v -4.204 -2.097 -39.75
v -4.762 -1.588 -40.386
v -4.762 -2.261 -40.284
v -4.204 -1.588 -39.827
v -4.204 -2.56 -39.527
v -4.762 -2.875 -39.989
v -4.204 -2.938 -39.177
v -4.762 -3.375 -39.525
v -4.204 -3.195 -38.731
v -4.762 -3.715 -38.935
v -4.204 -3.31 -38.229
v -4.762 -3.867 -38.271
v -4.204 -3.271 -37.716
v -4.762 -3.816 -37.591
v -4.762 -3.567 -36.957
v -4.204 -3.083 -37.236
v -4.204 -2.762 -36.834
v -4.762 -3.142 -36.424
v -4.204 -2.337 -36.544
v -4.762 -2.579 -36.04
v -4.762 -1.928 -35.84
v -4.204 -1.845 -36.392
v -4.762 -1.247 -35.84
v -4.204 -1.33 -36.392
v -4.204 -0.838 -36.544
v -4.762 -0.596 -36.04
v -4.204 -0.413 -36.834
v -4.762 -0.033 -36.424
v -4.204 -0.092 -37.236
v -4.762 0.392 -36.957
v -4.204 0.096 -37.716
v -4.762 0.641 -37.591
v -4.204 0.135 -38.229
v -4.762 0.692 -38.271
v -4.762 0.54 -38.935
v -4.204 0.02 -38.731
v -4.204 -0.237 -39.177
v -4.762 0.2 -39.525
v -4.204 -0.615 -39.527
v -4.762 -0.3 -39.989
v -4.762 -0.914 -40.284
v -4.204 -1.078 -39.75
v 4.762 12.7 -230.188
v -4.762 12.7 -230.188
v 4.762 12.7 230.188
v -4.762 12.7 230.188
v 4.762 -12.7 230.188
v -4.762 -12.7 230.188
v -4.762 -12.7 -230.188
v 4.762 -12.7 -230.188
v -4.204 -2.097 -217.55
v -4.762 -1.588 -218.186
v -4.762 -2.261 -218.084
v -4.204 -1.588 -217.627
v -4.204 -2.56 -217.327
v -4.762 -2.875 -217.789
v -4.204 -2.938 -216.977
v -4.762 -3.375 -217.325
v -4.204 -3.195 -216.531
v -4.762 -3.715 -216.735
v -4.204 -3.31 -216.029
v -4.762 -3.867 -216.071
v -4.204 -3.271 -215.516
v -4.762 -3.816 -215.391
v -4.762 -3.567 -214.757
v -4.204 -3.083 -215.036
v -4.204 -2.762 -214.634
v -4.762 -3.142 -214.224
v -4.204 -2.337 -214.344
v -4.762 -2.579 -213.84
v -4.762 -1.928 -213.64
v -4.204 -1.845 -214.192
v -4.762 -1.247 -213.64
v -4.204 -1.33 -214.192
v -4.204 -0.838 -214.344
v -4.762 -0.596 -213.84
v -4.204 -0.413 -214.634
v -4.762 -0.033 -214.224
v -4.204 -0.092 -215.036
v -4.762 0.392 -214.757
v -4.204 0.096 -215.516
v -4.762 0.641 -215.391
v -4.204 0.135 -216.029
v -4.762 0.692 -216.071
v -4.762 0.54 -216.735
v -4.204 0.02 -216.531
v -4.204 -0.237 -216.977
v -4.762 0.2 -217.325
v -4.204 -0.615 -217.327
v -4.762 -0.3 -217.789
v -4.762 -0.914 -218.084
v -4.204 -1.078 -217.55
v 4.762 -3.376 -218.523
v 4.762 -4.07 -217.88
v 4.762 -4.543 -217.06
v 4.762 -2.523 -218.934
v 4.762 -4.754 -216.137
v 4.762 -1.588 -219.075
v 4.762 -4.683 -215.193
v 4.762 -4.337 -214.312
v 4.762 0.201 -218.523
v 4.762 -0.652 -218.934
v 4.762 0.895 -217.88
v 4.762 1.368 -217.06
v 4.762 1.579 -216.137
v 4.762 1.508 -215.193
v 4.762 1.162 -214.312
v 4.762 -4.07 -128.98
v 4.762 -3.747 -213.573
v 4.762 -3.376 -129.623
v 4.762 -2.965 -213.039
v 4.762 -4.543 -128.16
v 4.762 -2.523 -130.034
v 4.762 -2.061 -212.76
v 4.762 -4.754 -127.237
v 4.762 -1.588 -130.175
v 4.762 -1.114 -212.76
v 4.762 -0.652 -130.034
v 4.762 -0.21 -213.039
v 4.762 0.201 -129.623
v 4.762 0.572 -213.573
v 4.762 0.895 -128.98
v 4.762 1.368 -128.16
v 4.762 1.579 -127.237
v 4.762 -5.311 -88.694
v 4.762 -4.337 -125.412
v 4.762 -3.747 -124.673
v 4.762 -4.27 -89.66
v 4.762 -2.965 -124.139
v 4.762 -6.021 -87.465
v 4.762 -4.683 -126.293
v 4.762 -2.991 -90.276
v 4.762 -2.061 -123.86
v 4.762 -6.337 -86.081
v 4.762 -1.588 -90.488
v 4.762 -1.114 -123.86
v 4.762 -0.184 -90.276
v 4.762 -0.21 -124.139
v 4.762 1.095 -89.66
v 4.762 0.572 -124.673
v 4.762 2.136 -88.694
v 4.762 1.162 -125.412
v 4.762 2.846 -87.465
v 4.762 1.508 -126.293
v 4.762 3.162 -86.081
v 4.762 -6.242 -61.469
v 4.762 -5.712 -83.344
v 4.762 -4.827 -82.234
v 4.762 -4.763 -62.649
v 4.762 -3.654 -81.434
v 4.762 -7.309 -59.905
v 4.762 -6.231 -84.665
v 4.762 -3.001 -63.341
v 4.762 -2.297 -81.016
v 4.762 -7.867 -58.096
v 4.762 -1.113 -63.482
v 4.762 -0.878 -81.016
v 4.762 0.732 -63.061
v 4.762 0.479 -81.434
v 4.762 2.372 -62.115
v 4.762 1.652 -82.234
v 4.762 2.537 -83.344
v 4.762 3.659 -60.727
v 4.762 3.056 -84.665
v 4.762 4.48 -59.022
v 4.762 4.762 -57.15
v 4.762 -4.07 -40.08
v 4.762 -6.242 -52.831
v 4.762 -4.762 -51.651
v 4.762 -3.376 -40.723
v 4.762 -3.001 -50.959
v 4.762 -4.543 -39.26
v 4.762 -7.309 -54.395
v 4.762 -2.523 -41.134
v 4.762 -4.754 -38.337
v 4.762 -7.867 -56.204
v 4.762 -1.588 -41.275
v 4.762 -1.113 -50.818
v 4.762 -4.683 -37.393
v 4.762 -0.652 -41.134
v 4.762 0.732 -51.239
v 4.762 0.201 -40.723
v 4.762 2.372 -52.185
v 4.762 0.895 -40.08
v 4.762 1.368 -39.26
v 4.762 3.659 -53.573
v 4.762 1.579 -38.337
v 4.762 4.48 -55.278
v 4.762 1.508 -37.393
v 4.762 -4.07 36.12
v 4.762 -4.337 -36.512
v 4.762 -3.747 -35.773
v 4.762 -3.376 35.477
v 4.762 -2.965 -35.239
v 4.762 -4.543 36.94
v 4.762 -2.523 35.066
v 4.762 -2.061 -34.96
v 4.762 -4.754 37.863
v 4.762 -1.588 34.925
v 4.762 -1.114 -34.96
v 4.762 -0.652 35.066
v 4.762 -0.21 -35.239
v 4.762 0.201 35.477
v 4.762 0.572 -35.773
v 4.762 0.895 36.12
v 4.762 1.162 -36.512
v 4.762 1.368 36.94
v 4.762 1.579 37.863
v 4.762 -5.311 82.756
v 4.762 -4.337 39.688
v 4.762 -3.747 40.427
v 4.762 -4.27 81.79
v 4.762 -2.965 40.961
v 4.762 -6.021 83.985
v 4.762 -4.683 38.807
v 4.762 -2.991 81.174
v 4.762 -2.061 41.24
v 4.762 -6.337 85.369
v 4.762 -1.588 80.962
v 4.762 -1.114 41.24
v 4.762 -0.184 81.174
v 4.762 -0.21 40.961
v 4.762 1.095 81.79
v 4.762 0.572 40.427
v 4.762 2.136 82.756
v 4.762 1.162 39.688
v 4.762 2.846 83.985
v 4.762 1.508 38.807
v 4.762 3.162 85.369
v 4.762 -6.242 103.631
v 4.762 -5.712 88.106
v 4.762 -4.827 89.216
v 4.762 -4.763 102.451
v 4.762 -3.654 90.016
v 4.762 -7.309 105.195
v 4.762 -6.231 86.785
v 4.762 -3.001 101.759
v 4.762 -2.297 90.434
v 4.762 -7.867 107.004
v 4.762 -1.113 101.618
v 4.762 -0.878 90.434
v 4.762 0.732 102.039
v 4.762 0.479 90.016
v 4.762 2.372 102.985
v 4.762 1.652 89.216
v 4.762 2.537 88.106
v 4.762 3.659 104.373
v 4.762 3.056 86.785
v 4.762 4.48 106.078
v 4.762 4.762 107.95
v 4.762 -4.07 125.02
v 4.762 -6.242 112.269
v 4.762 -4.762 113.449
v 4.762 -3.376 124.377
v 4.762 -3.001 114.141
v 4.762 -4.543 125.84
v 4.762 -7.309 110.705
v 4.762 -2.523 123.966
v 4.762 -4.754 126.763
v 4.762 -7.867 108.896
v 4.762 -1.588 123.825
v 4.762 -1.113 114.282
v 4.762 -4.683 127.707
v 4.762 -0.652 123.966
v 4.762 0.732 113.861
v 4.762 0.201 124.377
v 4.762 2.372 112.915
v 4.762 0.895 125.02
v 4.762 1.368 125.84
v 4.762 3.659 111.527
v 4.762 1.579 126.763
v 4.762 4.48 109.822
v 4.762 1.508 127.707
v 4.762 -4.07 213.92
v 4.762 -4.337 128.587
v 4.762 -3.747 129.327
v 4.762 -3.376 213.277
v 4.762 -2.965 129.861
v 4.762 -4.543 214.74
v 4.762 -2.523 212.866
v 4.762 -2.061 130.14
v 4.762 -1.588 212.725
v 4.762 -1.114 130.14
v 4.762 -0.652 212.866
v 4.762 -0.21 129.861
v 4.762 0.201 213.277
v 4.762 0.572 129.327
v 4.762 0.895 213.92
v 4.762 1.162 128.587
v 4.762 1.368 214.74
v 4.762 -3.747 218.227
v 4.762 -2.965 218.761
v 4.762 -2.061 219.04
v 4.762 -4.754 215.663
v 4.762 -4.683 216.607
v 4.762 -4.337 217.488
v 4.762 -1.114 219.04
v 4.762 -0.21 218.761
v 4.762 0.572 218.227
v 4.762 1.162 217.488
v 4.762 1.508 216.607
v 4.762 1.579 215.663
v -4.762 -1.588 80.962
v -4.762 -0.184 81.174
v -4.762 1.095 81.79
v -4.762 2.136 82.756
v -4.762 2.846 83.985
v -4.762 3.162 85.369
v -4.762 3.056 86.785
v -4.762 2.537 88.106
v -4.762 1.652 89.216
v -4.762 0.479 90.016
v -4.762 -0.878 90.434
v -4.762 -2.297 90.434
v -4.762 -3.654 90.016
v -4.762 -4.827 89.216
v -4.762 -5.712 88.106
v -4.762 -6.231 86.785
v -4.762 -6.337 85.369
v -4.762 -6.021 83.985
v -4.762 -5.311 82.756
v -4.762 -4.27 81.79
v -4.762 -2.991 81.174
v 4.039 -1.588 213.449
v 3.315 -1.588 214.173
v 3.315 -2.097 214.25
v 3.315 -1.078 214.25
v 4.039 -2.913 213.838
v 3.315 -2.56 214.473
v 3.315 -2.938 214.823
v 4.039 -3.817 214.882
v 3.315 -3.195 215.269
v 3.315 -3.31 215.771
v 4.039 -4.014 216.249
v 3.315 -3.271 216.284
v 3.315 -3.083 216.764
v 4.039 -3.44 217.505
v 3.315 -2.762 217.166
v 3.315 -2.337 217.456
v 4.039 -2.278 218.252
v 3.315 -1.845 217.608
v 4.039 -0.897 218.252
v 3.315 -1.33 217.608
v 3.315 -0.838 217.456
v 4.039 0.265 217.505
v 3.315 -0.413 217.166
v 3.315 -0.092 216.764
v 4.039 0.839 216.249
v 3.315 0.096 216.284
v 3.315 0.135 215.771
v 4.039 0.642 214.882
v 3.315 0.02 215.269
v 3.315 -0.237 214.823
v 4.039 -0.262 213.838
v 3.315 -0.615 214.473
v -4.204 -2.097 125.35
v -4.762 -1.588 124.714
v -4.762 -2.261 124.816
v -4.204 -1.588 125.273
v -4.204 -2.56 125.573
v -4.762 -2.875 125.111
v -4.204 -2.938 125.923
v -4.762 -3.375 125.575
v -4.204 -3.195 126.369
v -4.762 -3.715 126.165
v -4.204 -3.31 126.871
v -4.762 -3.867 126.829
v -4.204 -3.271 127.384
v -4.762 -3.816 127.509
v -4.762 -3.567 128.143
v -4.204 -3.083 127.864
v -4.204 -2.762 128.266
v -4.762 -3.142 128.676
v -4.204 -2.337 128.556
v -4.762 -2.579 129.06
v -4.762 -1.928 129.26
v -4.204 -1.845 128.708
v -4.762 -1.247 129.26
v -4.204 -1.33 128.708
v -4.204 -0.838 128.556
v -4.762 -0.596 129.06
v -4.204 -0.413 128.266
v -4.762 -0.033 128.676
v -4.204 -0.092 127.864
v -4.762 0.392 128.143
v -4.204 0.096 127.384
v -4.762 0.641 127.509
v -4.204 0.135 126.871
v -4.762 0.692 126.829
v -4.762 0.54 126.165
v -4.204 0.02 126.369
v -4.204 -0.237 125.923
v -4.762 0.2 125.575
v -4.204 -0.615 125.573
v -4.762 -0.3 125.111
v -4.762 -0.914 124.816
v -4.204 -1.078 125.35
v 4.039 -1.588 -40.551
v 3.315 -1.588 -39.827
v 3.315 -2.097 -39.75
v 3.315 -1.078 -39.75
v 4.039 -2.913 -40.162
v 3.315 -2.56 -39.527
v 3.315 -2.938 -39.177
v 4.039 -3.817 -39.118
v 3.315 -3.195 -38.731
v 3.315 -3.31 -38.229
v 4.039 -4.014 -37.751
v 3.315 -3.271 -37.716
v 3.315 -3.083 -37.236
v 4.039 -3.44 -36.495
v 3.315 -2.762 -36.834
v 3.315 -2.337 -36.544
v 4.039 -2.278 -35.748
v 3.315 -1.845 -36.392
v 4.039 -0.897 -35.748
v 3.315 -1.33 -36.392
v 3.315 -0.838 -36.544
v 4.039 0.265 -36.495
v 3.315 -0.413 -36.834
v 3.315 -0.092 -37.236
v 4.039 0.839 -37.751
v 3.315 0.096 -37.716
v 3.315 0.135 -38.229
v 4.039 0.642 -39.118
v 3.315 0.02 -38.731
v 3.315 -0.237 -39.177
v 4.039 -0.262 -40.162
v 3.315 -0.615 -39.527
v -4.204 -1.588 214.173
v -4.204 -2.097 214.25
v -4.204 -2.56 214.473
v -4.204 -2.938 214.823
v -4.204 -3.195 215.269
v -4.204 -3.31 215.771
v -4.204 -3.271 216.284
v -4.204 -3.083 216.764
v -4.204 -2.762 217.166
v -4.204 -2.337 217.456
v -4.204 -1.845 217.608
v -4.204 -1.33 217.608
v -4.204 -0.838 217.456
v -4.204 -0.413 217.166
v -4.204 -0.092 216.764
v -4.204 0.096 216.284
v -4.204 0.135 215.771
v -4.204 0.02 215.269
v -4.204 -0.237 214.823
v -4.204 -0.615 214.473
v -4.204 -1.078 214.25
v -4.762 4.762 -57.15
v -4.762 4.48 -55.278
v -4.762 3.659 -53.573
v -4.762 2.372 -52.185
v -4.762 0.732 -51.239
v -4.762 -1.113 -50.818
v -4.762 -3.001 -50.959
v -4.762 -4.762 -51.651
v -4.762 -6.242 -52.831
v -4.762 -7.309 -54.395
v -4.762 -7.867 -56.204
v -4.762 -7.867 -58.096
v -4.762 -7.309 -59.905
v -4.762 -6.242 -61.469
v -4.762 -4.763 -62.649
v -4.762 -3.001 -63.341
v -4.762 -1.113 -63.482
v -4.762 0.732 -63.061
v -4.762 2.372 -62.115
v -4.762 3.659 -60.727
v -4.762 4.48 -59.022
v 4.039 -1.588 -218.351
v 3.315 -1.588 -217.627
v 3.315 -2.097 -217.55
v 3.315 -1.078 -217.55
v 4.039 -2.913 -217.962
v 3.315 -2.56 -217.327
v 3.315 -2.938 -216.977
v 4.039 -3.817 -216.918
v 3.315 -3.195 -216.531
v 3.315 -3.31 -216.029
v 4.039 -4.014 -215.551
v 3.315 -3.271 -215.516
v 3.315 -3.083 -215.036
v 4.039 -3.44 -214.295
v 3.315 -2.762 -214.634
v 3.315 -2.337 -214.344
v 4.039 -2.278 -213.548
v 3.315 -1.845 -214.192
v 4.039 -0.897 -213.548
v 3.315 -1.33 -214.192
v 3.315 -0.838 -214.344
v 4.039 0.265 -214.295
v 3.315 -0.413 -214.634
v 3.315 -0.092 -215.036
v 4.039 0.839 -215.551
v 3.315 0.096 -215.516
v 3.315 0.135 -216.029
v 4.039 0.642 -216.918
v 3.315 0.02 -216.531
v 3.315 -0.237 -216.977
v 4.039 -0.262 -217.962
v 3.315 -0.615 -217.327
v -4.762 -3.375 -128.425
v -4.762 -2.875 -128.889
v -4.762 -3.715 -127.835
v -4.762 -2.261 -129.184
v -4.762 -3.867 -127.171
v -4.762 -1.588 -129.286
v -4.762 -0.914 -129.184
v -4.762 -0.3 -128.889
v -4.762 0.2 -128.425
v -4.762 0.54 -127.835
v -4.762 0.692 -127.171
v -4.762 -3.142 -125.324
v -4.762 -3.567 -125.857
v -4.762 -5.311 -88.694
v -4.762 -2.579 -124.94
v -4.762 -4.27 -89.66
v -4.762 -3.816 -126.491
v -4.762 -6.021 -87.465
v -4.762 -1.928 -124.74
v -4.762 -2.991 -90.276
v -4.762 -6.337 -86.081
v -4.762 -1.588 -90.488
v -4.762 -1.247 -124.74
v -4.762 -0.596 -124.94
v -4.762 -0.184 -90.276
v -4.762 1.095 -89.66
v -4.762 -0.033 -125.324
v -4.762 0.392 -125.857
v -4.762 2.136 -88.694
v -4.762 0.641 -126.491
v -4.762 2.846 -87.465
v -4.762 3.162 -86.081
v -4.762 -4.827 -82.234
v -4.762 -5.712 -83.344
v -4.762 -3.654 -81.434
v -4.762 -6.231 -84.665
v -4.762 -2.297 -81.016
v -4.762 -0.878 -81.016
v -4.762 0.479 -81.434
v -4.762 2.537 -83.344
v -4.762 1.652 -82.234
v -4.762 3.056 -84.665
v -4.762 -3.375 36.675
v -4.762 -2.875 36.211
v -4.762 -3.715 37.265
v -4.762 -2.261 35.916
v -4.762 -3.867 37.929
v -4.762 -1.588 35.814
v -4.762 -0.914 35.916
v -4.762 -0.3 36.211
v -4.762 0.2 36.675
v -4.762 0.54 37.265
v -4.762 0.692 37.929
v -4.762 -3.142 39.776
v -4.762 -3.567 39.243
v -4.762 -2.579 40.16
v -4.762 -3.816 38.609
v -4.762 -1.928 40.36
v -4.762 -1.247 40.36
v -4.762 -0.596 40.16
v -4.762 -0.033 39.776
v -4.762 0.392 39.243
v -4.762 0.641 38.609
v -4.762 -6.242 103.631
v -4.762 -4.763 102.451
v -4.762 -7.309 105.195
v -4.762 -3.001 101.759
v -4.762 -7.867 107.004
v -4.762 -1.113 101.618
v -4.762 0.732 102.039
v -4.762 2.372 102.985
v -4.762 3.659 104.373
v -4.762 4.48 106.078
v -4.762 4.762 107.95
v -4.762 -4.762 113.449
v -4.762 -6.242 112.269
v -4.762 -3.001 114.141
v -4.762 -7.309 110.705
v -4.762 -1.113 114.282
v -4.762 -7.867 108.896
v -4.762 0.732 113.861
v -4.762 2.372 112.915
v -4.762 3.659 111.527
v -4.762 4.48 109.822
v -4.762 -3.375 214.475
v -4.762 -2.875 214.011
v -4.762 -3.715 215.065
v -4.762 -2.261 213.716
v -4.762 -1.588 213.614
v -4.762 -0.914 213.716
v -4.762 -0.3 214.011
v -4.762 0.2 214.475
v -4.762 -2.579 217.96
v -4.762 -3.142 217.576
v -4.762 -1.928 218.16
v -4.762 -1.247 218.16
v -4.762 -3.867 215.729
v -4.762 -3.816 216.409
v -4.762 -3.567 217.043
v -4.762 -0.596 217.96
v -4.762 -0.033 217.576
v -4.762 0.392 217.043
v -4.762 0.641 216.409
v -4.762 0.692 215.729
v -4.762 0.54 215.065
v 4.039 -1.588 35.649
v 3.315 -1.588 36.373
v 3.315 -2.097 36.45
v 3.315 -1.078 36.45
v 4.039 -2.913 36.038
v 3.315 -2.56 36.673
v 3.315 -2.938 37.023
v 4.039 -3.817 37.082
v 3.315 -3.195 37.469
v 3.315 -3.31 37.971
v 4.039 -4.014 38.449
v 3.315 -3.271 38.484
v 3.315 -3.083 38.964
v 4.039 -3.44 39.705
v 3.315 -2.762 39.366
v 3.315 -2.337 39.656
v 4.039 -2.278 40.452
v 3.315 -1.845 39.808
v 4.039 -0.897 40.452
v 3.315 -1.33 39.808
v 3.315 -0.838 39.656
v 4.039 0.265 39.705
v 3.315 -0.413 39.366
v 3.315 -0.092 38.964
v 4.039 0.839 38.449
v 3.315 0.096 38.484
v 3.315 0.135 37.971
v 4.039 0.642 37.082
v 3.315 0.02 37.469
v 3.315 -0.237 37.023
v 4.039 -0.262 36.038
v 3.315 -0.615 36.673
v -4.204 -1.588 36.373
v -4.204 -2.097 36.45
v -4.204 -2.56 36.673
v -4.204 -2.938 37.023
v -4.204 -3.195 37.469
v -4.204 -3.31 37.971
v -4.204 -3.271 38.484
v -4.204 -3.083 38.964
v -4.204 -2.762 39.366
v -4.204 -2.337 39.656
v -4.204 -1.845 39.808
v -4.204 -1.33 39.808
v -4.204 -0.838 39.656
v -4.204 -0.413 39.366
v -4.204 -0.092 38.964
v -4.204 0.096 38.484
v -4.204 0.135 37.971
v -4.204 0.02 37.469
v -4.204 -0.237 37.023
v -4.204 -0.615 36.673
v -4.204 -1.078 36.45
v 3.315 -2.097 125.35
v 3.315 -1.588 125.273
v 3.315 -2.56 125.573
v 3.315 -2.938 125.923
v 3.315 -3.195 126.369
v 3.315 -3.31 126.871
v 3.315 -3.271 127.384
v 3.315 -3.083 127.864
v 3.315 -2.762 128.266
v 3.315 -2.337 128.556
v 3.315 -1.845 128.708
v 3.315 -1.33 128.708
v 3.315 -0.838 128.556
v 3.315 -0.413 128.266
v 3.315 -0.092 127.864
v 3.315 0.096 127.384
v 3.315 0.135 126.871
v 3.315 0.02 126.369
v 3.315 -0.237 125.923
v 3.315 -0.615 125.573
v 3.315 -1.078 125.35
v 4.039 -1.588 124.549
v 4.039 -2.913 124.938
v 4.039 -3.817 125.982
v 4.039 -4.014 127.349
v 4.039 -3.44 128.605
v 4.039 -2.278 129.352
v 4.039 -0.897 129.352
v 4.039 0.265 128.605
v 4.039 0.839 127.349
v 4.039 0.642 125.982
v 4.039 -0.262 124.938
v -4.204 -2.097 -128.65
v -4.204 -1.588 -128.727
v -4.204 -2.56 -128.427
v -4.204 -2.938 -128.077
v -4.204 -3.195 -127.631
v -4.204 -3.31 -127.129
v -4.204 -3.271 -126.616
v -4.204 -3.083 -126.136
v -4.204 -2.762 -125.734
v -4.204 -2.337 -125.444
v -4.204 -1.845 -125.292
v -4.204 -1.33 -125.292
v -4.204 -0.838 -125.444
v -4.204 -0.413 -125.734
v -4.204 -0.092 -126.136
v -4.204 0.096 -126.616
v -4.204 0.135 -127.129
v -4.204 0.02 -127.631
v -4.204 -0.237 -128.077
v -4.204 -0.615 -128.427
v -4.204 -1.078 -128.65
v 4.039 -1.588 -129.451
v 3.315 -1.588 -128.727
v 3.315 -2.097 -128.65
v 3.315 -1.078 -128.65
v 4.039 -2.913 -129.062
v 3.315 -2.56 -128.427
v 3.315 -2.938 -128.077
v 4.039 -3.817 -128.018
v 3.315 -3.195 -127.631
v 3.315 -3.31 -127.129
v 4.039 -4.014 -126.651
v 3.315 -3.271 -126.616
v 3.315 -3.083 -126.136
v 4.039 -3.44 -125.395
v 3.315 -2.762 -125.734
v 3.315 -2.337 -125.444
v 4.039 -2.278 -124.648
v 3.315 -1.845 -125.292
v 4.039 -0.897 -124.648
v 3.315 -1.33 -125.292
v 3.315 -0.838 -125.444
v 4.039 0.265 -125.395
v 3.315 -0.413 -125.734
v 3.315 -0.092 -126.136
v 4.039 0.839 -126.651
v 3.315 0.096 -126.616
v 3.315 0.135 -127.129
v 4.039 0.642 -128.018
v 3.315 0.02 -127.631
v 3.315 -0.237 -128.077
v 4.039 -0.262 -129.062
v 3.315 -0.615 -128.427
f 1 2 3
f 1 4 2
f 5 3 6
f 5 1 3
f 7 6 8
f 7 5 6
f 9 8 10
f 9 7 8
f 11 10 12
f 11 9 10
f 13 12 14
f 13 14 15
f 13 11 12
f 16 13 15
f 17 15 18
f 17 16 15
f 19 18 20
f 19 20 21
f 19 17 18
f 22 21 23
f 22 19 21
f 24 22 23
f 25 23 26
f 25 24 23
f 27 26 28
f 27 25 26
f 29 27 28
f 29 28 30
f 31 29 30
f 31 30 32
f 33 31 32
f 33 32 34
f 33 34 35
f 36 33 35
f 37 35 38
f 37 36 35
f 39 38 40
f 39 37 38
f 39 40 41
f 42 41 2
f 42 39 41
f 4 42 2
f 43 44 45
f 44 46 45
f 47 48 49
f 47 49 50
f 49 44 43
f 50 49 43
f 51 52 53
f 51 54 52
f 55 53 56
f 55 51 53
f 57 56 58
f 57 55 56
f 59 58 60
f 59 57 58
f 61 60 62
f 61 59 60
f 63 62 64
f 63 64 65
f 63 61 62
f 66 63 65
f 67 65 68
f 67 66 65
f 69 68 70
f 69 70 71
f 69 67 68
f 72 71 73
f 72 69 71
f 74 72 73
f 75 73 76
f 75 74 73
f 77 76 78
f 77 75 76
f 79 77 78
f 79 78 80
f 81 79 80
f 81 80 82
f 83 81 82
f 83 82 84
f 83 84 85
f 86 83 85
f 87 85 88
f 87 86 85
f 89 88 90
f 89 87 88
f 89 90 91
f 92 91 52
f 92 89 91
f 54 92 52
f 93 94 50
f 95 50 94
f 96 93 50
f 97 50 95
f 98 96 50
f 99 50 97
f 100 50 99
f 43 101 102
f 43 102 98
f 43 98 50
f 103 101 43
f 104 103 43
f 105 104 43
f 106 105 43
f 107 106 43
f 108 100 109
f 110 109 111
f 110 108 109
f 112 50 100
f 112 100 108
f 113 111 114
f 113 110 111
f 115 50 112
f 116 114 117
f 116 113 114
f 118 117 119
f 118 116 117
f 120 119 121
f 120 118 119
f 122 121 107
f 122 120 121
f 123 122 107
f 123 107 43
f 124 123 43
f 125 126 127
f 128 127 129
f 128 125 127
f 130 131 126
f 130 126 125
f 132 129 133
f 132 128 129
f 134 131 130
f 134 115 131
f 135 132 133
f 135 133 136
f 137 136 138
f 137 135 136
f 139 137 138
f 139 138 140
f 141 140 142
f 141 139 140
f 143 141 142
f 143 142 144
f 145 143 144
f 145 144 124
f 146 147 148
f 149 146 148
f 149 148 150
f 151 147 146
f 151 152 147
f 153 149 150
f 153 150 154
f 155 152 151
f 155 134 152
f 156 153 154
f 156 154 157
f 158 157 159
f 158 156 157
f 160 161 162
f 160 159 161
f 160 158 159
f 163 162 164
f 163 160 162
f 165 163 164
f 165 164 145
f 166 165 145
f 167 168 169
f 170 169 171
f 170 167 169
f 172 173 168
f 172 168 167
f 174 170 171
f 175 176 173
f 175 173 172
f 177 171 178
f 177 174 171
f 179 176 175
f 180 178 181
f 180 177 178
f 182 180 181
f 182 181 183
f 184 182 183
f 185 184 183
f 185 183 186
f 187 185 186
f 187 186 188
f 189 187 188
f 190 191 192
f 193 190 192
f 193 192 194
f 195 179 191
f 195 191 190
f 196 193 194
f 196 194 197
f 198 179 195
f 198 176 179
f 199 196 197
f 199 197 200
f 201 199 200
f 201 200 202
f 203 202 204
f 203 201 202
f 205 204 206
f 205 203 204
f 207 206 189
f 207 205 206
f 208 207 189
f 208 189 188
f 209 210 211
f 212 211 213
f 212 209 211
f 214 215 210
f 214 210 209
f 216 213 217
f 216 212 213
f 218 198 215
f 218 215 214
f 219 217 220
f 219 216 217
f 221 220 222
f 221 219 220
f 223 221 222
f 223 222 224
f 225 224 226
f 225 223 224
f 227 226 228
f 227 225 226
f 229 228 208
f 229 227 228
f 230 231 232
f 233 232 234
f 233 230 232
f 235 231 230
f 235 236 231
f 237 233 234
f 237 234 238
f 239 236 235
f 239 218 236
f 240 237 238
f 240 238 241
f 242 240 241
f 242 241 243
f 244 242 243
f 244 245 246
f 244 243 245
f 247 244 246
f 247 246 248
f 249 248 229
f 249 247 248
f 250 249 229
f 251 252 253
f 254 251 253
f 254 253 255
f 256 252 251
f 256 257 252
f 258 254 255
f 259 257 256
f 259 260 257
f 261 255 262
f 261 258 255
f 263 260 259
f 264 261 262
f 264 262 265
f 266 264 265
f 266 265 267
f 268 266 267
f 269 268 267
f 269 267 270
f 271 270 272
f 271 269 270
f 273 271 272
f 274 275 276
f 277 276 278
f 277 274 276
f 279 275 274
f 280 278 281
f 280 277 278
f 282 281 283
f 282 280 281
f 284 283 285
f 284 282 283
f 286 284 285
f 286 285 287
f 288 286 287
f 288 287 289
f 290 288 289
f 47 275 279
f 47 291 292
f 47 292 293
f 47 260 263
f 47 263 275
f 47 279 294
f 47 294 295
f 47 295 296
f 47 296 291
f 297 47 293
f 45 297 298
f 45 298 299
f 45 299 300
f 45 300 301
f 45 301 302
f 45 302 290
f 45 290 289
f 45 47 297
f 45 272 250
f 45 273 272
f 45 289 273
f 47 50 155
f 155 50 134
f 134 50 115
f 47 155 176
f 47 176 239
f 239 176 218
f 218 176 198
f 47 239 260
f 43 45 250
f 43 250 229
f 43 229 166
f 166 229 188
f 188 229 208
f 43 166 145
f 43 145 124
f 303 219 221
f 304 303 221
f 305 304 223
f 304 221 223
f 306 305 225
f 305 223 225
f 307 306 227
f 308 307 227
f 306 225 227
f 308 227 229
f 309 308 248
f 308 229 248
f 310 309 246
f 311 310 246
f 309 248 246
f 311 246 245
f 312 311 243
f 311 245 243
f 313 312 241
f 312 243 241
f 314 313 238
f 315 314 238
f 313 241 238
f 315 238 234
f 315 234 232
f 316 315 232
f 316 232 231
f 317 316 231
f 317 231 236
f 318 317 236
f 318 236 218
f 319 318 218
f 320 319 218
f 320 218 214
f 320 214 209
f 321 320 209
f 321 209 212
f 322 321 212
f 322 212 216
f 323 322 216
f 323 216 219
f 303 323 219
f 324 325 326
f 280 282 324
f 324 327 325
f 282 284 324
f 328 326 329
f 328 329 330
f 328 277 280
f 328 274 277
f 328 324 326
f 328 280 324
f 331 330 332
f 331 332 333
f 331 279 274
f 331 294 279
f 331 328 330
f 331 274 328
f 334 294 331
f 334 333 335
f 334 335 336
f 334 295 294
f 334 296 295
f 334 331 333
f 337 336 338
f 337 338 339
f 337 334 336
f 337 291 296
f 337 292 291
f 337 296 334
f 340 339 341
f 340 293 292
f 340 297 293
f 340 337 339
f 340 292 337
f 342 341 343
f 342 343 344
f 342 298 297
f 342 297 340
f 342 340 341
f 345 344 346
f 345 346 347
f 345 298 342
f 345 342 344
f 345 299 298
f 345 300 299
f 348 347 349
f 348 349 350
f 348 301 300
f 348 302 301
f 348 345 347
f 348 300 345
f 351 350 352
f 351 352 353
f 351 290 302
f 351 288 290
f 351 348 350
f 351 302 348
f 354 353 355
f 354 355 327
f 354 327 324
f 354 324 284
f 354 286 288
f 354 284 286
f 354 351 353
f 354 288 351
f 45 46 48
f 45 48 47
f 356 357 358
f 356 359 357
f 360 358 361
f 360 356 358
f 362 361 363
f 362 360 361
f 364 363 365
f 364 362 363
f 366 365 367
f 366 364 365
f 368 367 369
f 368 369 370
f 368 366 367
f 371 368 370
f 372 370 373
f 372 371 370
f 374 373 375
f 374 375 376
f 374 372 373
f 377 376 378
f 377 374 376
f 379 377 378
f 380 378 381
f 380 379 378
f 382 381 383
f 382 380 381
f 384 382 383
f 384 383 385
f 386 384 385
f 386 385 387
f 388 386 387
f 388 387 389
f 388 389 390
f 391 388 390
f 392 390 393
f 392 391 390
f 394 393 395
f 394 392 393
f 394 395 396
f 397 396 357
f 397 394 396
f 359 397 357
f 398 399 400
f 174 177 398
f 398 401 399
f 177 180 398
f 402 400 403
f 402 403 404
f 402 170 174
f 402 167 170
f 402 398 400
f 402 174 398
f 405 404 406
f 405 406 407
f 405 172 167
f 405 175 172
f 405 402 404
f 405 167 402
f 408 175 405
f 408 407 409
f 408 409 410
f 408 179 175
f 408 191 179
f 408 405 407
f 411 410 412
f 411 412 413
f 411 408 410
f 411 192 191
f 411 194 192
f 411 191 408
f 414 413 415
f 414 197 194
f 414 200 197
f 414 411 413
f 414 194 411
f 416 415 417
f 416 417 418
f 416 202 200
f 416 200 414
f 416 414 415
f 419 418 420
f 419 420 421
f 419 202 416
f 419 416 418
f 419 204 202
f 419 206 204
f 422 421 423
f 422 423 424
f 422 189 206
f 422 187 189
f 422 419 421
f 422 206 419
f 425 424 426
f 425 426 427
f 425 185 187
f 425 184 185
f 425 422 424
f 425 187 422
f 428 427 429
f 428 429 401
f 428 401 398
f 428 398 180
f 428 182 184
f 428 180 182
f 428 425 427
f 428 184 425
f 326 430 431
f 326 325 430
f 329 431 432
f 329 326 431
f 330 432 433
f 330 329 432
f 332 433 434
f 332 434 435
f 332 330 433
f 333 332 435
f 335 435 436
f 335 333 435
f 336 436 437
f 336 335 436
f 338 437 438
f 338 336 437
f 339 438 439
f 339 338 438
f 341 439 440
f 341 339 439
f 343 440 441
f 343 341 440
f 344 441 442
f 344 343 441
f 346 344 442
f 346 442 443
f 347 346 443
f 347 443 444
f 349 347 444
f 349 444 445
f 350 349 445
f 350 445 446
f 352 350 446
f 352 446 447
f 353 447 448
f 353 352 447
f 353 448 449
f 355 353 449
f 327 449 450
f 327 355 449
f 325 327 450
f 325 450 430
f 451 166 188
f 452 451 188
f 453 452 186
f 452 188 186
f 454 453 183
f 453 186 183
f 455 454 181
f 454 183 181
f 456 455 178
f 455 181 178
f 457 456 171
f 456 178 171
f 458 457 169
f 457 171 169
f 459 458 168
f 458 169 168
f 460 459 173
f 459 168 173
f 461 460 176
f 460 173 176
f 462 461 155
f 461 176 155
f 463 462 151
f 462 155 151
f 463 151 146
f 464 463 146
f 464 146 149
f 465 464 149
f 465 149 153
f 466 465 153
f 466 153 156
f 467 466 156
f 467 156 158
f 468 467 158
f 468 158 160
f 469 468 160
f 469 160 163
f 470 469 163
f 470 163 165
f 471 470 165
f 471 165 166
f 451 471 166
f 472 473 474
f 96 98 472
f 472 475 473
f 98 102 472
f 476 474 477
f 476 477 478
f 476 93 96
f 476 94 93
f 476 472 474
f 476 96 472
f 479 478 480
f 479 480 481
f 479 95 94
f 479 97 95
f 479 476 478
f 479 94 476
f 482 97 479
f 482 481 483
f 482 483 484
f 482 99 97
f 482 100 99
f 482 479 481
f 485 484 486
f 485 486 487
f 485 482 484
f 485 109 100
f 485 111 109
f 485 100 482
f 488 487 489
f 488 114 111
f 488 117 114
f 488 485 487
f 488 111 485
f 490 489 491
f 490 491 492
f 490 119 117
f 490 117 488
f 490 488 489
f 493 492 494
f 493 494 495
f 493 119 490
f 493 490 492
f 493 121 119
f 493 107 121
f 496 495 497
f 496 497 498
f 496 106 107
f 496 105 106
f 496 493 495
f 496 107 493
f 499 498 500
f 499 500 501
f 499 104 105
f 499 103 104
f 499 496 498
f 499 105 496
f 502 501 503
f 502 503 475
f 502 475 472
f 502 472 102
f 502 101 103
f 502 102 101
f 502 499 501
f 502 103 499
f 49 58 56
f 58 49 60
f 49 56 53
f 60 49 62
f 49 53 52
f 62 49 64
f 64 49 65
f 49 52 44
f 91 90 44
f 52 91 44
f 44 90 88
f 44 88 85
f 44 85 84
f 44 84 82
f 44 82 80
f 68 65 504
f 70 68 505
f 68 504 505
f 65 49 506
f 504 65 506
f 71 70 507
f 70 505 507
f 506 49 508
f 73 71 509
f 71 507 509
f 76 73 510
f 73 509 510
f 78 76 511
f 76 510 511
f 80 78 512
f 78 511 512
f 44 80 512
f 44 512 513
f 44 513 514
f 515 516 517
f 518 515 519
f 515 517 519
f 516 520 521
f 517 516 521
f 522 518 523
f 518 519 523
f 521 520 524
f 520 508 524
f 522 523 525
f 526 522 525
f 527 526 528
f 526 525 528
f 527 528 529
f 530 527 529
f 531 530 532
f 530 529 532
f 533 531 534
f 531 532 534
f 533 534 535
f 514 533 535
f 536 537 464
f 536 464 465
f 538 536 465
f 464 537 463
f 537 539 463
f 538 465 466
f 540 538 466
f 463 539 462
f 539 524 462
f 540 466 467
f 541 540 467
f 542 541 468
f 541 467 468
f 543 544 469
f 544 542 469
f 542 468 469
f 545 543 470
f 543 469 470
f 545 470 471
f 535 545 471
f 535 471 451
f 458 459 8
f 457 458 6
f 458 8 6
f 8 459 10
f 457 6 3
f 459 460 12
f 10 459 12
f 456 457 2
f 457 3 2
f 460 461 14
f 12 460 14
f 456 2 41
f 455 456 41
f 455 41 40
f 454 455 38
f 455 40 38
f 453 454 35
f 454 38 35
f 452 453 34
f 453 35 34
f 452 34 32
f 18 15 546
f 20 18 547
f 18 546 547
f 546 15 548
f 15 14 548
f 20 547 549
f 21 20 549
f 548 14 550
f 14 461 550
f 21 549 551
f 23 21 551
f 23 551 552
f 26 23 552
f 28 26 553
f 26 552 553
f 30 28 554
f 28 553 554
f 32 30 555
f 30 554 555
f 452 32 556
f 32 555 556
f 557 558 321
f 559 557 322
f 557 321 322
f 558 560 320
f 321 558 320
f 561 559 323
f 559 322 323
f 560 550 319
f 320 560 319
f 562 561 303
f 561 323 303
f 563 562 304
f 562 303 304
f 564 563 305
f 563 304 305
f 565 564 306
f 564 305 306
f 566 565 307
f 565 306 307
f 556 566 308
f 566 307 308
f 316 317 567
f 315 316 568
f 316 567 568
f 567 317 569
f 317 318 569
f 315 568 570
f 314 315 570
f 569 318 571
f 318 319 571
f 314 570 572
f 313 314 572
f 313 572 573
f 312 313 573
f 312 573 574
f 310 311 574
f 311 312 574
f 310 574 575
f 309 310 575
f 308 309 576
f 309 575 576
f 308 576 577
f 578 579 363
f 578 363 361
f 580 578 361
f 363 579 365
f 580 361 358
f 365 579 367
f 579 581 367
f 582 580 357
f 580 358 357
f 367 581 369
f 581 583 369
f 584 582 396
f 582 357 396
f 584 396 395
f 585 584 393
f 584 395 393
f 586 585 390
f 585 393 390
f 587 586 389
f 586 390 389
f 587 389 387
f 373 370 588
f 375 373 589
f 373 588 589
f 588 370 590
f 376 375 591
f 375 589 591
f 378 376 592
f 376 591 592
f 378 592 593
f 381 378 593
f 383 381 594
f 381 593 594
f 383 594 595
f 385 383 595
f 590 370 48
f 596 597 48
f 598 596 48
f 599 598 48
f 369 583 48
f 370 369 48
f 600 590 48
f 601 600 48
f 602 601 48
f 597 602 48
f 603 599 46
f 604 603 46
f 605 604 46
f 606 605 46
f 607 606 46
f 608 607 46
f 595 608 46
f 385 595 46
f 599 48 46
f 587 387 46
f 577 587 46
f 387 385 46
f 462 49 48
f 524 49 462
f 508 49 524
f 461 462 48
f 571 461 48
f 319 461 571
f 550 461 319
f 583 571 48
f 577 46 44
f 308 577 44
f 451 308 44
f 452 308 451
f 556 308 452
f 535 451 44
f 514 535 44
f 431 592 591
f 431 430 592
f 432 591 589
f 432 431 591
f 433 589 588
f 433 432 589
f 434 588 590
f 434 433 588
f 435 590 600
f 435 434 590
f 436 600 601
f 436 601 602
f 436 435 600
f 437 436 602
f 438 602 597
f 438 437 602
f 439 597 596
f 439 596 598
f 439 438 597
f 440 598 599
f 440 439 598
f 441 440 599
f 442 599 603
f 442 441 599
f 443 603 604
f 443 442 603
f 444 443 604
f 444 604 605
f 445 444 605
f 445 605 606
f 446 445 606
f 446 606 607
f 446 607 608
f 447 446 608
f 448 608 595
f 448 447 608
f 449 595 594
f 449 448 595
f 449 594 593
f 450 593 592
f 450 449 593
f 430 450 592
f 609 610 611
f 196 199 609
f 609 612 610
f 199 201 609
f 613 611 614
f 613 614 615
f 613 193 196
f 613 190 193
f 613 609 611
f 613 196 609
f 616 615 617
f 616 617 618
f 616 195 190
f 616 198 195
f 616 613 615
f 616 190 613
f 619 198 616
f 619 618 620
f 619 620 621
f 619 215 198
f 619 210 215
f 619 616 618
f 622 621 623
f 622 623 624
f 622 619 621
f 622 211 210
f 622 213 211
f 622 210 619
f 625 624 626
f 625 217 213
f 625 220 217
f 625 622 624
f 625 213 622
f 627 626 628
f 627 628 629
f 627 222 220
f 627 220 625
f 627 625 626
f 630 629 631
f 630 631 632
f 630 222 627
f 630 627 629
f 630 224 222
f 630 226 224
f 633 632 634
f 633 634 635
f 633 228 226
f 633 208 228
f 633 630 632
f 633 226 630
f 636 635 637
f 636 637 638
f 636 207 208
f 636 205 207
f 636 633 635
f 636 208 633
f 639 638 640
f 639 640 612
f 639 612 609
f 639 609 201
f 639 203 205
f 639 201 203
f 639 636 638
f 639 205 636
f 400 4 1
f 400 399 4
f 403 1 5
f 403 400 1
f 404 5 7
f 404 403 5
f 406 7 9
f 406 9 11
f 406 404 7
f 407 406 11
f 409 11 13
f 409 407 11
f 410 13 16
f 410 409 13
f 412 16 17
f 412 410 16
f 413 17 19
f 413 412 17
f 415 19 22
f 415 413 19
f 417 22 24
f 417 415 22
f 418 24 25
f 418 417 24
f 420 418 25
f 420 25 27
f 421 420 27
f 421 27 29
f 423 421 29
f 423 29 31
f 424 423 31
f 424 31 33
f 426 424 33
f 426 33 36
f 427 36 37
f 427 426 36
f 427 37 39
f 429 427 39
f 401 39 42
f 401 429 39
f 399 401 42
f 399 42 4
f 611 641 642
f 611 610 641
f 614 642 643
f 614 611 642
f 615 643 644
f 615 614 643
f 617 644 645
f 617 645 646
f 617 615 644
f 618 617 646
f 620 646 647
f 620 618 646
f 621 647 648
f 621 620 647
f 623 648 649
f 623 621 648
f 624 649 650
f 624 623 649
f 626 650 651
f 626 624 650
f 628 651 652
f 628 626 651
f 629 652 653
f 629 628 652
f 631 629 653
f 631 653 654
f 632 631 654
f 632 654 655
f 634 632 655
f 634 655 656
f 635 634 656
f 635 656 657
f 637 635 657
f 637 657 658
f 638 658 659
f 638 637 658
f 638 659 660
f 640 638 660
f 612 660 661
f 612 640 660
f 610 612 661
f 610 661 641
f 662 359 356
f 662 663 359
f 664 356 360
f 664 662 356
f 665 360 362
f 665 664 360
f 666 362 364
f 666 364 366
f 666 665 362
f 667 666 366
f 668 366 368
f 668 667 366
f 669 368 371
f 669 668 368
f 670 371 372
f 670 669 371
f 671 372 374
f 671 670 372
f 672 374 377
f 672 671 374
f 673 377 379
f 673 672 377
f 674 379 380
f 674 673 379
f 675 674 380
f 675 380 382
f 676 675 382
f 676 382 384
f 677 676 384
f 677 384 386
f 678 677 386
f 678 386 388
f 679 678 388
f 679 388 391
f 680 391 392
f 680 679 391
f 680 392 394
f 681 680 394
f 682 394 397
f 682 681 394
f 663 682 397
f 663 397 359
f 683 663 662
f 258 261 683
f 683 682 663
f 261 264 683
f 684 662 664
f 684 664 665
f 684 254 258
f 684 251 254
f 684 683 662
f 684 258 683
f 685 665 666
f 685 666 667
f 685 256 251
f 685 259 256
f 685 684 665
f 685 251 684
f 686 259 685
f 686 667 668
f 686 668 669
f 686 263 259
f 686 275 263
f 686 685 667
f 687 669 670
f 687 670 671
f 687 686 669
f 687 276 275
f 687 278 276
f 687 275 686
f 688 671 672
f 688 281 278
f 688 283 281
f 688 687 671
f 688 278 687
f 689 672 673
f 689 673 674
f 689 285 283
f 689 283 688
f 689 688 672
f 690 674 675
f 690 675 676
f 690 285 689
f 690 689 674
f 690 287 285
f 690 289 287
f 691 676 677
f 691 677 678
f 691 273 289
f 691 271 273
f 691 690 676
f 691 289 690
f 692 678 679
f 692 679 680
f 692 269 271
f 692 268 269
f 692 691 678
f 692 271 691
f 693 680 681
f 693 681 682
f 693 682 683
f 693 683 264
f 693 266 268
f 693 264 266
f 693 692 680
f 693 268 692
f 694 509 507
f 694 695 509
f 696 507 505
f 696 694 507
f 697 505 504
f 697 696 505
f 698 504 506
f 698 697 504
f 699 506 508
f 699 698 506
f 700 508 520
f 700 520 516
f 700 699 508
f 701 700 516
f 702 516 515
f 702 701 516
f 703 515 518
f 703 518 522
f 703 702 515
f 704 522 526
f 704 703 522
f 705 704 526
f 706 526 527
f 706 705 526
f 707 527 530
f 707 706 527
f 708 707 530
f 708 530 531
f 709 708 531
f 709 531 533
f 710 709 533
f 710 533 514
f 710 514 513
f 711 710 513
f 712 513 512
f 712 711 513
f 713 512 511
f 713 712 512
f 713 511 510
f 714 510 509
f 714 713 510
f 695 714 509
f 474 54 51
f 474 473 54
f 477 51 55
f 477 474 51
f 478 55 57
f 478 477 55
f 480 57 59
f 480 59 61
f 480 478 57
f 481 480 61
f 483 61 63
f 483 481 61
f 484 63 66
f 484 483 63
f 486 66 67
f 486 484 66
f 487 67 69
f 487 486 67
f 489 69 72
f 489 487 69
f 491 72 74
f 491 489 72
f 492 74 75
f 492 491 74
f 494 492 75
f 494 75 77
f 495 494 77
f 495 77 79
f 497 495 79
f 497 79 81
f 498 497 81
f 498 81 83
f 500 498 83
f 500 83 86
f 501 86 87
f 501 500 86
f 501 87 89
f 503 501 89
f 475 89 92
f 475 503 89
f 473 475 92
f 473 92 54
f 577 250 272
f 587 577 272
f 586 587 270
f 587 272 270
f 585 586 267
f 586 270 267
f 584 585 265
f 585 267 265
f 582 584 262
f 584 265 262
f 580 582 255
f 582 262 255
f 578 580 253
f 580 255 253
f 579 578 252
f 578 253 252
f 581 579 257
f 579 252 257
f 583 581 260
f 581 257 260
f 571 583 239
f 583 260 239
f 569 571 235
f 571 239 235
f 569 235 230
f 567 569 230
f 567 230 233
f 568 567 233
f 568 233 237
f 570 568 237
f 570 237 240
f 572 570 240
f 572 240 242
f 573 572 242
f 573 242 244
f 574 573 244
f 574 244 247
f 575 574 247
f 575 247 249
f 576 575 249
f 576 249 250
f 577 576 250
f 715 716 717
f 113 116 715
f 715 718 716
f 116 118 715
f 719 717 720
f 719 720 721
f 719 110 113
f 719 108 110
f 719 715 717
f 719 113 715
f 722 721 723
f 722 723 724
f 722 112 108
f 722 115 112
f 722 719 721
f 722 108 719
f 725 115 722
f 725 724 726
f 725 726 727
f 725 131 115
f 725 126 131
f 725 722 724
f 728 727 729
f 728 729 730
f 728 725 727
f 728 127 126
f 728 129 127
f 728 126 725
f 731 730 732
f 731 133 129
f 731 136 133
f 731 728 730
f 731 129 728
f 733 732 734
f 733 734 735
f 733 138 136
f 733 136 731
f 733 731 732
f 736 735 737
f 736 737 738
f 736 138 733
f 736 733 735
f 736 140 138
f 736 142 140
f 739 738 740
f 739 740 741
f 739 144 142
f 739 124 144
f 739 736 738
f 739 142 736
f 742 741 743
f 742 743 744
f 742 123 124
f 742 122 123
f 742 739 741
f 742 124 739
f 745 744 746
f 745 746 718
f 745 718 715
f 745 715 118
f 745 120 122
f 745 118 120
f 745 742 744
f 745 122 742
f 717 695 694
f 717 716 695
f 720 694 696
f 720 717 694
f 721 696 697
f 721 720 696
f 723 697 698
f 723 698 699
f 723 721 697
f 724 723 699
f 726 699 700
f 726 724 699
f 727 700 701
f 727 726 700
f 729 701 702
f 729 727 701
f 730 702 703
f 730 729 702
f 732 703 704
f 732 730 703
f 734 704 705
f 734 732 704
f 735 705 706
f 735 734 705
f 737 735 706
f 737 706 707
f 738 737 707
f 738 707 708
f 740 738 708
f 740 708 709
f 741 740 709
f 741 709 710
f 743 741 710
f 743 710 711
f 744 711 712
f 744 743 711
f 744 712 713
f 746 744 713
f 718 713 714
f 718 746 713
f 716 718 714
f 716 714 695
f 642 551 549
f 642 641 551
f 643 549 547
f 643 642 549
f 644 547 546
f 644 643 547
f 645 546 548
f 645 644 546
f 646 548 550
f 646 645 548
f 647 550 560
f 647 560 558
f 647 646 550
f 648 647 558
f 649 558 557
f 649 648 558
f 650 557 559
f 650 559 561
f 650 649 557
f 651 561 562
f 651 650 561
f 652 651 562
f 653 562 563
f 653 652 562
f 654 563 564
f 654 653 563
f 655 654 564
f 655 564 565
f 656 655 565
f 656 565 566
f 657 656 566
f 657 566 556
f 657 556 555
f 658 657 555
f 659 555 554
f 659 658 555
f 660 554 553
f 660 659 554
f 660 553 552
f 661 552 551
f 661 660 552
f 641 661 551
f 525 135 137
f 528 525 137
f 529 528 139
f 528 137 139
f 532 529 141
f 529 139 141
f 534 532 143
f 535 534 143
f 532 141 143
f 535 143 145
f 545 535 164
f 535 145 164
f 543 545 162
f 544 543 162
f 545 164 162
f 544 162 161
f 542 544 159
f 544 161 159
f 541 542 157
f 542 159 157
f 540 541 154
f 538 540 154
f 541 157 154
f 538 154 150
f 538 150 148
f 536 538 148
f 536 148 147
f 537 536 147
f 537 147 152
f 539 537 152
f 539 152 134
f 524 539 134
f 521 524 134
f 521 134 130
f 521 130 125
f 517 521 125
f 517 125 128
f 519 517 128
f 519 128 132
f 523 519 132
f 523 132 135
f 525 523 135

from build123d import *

# Parameters (mm, degrees)
SKETCH1_W                      = 9.525
SKETCH1_H                      = 25.4
BOSS_EXTRUDE1_DEPTH            = 230.1875
CUT_EXTRUDE1_REACH             = 232.734
SKETCH2_R                      = 6.35
F_3_8_0_375_DIAMETER_HOLE1_D   = 9.525
F_8_32_TAPPED_HOLE1_AT_2_COUNT = 2
F_8_32_TAPPED_HOLE1_AT_2_PITCH = 177.8
F_8_32_TAPPED_HOLE1_AT_3_COUNT = 2
F_8_32_TAPPED_HOLE1_AT_3_PITCH = 254
F_8_32_TAPPED_HOLE1_AT_4_COUNT = 2
F_8_32_TAPPED_HOLE1_AT_4_PITCH = 431.8
F_8_32_TAPPED_HOLE1_AT_5_COUNT = 2
F_8_32_TAPPED_HOLE1_AT_5_PITCH = 342.9
F_8_32_TAPPED_HOLE1_AT_6_COUNT = 2
F_8_32_TAPPED_HOLE1_AT_6_PITCH = 88.9


with BuildPart() as part:
    # Sketch1 → Boss-Extrude1 (new, symmetric)
    with BuildSketch(Plane.XY):
        Rectangle(SKETCH1_W, SKETCH1_H)
    extrude(amount=BOSS_EXTRUDE1_DEPTH, both=True)

    # Sketch2 → Cut-Extrude1 (cut, up to next)
    with BuildSketch(Plane(origin=(4.7625, 0, 0), x_dir=(0, 0, -1), z_dir=(1, 0, 0)), mode=Mode.PRIVATE) as cut_extrude1_sk1:
        with Locations(Location((-107.95, -1.5875, 0), (0, 0, 90))):
            Circle(SKETCH2_R)
    cut_extrude1_tool1 = extrude(cut_extrude1_sk1.sketch, amount=-CUT_EXTRUDE1_REACH, mode=Mode.PRIVATE) & part.part
    # Sketch2 → Cut-Extrude1 (cut, up to next)
    with BuildSketch(Plane(origin=(4.7625, 0, 0), x_dir=(0, 0, -1), z_dir=(1, 0, 0)), mode=Mode.PRIVATE) as cut_extrude1_sk2:
        with Locations(Location((57.15, -1.5875, 0), (0, 0, 90))):
            Circle(SKETCH2_R)
    cut_extrude1_tool2 = extrude(cut_extrude1_sk2.sketch, amount=-CUT_EXTRUDE1_REACH, mode=Mode.PRIVATE) & part.part
    add(cut_extrude1_tool1.solids().sort_by_distance((4.7625, -1.5875, 107.95))[0], mode=Mode.SUBTRACT)
    add(cut_extrude1_tool2.solids().sort_by_distance((4.7625, -1.5875, -57.15))[0], mode=Mode.SUBTRACT)

    # 3/8 (0.375) Diameter Hole1 (through all)
    with Locations(Plane.ZY.offset(4.7625)):
        with Locations((85.725, -1.5875), (-85.725, -1.5875)):
            Hole(F_3_8_0_375_DIAMETER_HOLE1_D / 2)

    # Sketch5 → #8-32 Tapped Hole1 (revolve, cut)
    with BuildSketch(Plane(origin=(4.7625, -1.5875, -215.9), x_dir=(0, 0, -1), z_dir=(0, 1, 0))):
        Polygon((0, 0), (0, 9.525), (2.286, 9.525), (1.7272, 8.9662), (1.7272, 1.4478), (3.175, 0), align=None)
    f_8_32_tapped_hole1 = revolve(axis=Axis((11.1125, -1.5875, -215.9), (-1, 0, 0)), mode=Mode.SUBTRACT)

    # #8-32 Tapped Hole1 at 2: #8-32 Tapped Hole1 ×2
    with Locations(*[(0, 0, i * F_8_32_TAPPED_HOLE1_AT_2_PITCH) for i in range(1, F_8_32_TAPPED_HOLE1_AT_2_COUNT)]):
        add(f_8_32_tapped_hole1, mode=Mode.SUBTRACT)

    # #8-32 Tapped Hole1 at 3: #8-32 Tapped Hole1 ×2
    with Locations(*[(0, 0, i * F_8_32_TAPPED_HOLE1_AT_3_PITCH) for i in range(1, F_8_32_TAPPED_HOLE1_AT_3_COUNT)]):
        add(f_8_32_tapped_hole1, mode=Mode.SUBTRACT)

    # #8-32 Tapped Hole1 at 4: #8-32 Tapped Hole1 ×2
    with Locations(*[(0, 0, i * F_8_32_TAPPED_HOLE1_AT_4_PITCH) for i in range(1, F_8_32_TAPPED_HOLE1_AT_4_COUNT)]):
        add(f_8_32_tapped_hole1, mode=Mode.SUBTRACT)

    # #8-32 Tapped Hole1 at 5: #8-32 Tapped Hole1 ×2
    with Locations(*[(0, 0, i * F_8_32_TAPPED_HOLE1_AT_5_PITCH) for i in range(1, F_8_32_TAPPED_HOLE1_AT_5_COUNT)]):
        add(f_8_32_tapped_hole1, mode=Mode.SUBTRACT)

    # #8-32 Tapped Hole1 at 6: #8-32 Tapped Hole1 ×2
    with Locations(*[(0, 0, i * F_8_32_TAPPED_HOLE1_AT_6_PITCH) for i in range(1, F_8_32_TAPPED_HOLE1_AT_6_COUNT)]):
        add(f_8_32_tapped_hole1, mode=Mode.SUBTRACT)


solid = part.part
